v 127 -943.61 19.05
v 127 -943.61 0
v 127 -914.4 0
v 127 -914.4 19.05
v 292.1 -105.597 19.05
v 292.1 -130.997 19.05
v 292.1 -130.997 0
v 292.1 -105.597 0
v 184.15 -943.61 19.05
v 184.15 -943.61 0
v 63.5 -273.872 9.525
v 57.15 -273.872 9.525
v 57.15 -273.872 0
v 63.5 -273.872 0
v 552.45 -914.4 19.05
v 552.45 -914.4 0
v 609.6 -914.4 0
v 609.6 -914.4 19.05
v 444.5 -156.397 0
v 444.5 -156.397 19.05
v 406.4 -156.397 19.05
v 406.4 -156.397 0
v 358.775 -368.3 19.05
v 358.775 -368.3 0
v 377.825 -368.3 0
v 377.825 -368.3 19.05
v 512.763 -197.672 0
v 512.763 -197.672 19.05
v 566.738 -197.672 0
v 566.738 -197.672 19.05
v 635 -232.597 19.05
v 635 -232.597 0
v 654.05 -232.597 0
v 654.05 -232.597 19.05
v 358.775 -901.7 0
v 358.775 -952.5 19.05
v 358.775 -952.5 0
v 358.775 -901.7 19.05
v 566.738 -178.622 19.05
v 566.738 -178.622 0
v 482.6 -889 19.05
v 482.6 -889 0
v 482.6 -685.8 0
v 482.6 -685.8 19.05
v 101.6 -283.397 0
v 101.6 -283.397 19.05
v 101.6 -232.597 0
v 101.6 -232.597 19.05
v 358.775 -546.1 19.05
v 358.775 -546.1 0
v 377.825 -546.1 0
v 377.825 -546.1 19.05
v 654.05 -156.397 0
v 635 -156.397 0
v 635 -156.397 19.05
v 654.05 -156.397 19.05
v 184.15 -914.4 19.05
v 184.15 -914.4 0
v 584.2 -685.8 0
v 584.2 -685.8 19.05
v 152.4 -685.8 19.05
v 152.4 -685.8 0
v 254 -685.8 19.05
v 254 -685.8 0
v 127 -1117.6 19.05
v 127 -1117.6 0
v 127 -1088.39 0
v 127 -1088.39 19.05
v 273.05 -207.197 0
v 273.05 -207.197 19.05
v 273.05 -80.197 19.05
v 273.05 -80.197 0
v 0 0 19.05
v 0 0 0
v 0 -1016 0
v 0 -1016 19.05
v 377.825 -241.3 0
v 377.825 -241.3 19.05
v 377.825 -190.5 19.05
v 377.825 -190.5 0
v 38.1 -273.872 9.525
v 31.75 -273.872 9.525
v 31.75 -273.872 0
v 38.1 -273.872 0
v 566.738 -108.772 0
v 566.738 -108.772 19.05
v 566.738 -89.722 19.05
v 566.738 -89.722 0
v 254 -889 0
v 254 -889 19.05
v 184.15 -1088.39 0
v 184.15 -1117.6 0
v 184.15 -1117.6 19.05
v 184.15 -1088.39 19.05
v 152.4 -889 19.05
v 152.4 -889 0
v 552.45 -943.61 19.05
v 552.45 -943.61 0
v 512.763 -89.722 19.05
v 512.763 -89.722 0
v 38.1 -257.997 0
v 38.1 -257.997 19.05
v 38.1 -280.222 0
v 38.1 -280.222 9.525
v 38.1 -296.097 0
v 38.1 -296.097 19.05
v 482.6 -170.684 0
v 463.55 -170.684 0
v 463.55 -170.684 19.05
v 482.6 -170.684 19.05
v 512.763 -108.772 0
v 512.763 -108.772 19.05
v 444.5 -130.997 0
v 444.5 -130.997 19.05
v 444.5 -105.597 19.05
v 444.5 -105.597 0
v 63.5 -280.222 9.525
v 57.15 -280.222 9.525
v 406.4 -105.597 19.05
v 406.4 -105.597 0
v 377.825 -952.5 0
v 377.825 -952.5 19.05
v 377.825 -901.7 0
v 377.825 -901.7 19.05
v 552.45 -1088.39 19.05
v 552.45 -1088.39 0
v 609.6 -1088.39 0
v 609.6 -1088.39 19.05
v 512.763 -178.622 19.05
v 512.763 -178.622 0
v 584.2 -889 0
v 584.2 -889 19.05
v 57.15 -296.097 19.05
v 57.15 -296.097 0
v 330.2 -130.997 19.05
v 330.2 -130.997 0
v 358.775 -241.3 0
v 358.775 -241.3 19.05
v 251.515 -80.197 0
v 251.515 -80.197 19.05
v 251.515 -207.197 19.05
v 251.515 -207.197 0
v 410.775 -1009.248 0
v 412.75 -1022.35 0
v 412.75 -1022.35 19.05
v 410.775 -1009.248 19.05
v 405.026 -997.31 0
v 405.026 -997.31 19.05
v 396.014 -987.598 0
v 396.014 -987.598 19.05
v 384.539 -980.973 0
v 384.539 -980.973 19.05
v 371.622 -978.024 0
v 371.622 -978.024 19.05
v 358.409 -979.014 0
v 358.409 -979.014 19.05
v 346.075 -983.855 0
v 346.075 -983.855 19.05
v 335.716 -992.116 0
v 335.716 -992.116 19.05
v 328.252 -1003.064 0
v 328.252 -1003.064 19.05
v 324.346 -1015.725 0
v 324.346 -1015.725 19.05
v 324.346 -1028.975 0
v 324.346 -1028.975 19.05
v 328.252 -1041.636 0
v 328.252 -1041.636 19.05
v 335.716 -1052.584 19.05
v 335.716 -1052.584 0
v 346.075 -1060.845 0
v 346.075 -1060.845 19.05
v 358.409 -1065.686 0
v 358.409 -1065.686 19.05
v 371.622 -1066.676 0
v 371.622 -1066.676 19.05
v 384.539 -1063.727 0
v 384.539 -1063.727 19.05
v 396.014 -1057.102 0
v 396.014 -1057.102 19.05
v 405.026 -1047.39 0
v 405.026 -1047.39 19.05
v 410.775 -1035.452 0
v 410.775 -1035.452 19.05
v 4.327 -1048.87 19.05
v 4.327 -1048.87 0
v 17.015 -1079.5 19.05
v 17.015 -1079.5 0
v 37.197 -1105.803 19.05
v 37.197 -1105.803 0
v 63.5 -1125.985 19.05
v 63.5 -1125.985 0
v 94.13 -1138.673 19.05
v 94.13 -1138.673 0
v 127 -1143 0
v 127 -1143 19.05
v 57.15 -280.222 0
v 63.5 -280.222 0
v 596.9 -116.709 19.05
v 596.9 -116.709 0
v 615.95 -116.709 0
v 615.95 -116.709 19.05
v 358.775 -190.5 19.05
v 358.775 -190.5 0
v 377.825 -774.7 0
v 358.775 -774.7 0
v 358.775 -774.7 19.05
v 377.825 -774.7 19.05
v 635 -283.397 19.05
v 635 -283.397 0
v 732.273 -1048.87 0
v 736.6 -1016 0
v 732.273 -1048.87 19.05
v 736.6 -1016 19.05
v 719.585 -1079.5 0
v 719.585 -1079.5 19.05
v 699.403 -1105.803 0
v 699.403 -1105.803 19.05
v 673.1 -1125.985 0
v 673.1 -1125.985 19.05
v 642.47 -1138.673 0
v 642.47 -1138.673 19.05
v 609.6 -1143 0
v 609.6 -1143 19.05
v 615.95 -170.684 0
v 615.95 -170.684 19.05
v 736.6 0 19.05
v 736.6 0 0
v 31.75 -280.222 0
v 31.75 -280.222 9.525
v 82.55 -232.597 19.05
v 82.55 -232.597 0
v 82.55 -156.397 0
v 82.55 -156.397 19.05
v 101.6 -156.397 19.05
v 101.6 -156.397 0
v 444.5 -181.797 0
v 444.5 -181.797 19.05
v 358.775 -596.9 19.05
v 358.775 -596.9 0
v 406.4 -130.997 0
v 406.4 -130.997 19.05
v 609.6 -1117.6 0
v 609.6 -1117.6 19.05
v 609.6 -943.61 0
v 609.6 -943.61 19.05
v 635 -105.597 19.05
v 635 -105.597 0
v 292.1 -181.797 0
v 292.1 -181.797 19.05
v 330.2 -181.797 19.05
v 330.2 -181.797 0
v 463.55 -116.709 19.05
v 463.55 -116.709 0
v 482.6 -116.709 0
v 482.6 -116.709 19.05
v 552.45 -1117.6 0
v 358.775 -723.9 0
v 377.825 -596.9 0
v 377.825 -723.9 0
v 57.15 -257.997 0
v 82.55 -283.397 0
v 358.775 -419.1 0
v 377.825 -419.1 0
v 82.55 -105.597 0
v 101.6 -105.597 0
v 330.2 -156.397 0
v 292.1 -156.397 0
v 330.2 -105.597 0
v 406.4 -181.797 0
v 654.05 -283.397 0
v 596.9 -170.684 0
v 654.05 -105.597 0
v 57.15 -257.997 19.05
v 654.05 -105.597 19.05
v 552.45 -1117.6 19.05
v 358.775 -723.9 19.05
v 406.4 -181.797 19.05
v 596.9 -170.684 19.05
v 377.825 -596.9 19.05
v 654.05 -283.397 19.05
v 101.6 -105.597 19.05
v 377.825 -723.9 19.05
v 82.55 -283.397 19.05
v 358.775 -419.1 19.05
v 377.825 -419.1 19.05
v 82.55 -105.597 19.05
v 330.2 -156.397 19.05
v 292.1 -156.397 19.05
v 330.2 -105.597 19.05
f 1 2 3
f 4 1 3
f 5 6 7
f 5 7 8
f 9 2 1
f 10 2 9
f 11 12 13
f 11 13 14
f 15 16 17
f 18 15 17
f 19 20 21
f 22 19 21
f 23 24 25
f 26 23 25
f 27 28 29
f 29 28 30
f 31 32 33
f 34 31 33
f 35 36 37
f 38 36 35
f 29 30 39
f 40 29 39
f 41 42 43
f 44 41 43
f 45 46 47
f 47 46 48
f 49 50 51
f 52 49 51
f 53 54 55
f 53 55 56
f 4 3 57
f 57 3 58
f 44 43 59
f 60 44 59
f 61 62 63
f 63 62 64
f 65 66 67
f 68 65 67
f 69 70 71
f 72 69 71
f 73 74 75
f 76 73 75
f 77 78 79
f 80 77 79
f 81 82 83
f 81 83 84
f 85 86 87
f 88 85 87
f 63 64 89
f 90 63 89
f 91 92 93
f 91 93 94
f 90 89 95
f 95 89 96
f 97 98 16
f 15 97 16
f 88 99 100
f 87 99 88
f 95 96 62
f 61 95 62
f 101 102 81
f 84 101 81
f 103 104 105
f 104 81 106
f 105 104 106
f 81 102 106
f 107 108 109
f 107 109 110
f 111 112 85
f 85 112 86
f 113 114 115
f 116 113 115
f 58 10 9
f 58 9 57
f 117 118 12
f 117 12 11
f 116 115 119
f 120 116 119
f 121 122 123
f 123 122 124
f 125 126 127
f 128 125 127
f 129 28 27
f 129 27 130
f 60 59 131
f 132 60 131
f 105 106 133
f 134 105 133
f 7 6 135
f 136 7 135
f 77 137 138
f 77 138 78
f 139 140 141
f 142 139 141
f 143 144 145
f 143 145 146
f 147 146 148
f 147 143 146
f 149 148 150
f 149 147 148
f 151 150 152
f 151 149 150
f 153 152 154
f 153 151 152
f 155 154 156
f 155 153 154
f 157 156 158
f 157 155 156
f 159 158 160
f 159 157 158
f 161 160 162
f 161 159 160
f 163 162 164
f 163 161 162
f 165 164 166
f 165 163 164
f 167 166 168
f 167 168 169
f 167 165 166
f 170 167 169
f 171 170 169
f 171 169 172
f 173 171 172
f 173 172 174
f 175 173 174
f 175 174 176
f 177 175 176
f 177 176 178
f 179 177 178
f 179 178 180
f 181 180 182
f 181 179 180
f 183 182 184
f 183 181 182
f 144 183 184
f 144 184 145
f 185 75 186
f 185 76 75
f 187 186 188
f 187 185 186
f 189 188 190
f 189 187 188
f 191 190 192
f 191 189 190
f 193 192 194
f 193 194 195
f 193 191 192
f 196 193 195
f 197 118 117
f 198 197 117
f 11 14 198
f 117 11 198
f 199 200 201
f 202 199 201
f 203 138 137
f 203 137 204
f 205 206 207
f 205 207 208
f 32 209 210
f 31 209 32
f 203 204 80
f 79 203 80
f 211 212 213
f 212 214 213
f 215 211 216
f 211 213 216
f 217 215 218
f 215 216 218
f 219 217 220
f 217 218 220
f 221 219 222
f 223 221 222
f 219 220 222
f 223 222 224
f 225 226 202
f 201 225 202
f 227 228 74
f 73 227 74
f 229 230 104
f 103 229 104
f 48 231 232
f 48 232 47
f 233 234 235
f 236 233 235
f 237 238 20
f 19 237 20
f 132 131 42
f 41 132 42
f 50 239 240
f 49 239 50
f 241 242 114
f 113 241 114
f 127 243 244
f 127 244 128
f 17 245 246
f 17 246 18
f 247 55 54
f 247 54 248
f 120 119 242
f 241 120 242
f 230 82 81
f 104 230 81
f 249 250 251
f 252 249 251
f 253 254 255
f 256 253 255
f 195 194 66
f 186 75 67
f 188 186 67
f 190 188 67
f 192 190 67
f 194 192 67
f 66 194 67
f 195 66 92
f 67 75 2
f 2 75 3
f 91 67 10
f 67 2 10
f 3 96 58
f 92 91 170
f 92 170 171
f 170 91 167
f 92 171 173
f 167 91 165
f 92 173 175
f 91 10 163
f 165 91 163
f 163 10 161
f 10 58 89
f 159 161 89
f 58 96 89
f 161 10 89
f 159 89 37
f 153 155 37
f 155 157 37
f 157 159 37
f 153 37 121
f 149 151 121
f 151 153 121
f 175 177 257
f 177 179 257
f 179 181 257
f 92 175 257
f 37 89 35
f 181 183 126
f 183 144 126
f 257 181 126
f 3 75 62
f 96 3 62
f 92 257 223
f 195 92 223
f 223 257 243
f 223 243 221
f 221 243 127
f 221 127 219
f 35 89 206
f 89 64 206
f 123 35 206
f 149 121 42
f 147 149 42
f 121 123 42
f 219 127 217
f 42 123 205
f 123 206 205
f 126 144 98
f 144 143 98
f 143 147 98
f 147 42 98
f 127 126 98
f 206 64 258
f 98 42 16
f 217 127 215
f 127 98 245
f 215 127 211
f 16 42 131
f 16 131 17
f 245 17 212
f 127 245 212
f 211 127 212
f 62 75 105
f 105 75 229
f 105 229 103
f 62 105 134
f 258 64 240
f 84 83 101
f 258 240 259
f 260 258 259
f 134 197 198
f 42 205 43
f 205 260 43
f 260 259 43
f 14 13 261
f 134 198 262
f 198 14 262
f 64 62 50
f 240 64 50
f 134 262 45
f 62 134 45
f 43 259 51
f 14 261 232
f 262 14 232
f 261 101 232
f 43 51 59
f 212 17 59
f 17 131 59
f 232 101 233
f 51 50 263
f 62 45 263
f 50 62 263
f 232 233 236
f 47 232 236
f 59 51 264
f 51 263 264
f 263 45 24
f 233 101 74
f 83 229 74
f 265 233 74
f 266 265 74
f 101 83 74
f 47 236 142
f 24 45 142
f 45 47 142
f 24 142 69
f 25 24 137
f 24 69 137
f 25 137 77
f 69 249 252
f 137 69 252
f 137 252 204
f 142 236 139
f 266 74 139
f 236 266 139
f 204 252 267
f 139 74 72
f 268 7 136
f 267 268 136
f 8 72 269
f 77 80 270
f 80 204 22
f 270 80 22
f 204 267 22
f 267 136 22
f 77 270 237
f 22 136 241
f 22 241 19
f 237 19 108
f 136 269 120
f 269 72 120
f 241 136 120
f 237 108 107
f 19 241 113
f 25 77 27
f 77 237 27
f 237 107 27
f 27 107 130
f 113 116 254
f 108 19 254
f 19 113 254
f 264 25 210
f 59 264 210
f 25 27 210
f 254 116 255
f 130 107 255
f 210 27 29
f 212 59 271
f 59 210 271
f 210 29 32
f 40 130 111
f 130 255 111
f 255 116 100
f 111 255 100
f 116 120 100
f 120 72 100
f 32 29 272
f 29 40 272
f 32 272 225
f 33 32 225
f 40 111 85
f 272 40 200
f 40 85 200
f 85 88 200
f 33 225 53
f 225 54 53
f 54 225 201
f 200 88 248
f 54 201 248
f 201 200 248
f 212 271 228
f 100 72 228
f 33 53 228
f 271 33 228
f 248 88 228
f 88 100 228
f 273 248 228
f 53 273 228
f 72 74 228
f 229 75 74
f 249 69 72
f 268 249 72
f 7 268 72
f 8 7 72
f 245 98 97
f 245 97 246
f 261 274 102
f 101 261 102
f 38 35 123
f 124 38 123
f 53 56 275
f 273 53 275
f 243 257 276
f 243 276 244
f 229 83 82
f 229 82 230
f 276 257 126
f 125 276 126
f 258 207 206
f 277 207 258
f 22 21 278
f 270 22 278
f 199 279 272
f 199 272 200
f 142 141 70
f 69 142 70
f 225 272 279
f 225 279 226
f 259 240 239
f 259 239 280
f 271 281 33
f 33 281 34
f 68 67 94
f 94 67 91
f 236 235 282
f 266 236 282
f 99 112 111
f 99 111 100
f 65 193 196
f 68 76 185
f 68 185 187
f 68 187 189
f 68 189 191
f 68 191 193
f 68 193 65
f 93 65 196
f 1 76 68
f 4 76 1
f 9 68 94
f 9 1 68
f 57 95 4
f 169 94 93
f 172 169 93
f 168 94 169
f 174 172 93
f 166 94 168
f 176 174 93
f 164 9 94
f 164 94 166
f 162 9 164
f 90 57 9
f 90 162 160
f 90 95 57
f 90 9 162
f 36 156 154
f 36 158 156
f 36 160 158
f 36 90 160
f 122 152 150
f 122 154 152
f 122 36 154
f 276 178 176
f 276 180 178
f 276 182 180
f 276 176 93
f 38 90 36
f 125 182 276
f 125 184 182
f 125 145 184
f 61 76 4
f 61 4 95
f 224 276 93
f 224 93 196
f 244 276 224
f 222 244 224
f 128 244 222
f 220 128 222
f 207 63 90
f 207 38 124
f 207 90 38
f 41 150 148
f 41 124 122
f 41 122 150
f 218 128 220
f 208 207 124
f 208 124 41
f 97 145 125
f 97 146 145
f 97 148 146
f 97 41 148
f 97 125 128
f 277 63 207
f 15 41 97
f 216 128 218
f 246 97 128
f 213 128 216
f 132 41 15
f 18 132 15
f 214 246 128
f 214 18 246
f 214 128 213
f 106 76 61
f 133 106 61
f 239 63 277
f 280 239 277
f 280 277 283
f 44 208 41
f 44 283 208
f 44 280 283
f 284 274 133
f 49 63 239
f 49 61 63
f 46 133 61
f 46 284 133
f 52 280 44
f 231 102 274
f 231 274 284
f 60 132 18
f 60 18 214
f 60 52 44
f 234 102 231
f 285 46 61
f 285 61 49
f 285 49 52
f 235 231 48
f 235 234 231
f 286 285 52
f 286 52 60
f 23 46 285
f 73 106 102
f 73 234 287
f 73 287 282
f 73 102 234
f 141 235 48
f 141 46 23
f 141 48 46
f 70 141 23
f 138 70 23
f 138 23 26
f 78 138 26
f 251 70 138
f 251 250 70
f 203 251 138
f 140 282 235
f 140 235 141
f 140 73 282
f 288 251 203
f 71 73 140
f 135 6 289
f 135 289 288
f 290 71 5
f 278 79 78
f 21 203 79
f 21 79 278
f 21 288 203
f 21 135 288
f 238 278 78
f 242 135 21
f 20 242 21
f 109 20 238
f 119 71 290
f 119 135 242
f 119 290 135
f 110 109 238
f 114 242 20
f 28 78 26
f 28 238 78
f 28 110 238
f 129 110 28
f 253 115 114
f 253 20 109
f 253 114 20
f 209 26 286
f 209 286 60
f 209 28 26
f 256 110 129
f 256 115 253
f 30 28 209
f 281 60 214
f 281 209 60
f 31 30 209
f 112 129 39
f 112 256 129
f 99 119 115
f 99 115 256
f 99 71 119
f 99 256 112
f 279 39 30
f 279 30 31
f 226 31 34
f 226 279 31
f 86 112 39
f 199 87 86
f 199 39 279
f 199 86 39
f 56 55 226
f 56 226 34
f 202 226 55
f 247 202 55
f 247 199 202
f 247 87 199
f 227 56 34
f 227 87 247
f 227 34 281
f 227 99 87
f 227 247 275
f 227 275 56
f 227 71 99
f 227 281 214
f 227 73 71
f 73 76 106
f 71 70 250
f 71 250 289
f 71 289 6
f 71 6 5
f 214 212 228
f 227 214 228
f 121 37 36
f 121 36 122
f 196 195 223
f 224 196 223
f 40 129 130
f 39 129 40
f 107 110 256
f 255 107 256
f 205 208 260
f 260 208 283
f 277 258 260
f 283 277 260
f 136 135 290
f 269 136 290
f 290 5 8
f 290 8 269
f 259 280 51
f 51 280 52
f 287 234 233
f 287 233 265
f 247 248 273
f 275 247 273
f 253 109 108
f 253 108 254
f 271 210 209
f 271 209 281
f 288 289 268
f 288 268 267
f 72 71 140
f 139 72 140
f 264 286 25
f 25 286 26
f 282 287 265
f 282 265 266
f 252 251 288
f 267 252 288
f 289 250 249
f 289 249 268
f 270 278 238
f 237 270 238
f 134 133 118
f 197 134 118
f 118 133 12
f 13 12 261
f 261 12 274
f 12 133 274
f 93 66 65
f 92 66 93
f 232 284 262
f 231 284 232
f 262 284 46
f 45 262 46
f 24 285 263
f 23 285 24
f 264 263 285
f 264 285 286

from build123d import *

# Parameters (mm, degrees)
F0_W      = 57.15
F0_H      = 29.21
F0_R      = 44.45
F1_DEPTH  = 19.05
F2_W      = 19.05
F2_H      = 50.8
F3_DEPTH  = 25.4
F4_W      = 19.05
F4_H      = 50.8
F5_DEPTH  = 25.4
F6_W      = 38.1
F6_H      = 25.4
F6_W_2    = 53.975
F6_H_2    = 19.05
F6_W_3    = 19.05
F6_H_3    = 53.975
F7_DEPTH  = 25.4
F8_R      = 127
F10_DEPTH = 25.4
F11_W     = 6.35
F11_H     = 6.35
F12_DEPTH = 9.525


# Not quite as in the source:
# - a feature names something its author has since deleted; it is built from what else it names


with BuildPart() as f1:
    # F0 (on Top) → F1 (new body)
    with BuildSketch(Plane.XY):
        Polygon((358.775, 0), (0, 0), (0, -889), (152.4, -889), (152.4, -685.8), (254, -685.8), (254, -889), (482.6, -889), (482.6, -685.8), (584.2, -685.8), (584.2, -889), (736.6, -889), (736.6, 0), (377.825, 0), align=None)
        Polygon((152.4, -889), (0, -889), (0, -1143), (358.775, -1143), (377.825, -1143), (736.6, -1143), (736.6, -889), (584.2, -889), (482.6, -889), (254, -889), align=None)
        with Locations((155.575, -1102.995)):
            Rectangle(F0_W, F0_H, mode=Mode.SUBTRACT)
        with Locations((155.575, -929.005)):
            Rectangle(F0_W, F0_H, mode=Mode.SUBTRACT)
        with Locations((368.3, -1022.35)):
            Circle(F0_R, mode=Mode.SUBTRACT)
        with Locations((581.025, -1102.995)):
            Rectangle(F0_W, F0_H, mode=Mode.SUBTRACT)
        with Locations((581.025, -929.005)):
            Rectangle(F0_W, F0_H, mode=Mode.SUBTRACT)
    extrude(amount=F1_DEPTH)

    # F2 (on face) → F3 (cut)
    with BuildSketch(Plane.XY.offset(19.05)):
        with Locations((368.3, -215.9)):
            Rectangle(F2_W, F2_H)
        with Locations((368.3, -393.7)):
            Rectangle(F2_W, F2_H)
        with Locations((368.3, -571.5)):
            Rectangle(F2_W, F2_H)
        with Locations((368.3, -749.3)):
            Rectangle(F2_W, F2_H)
        with Locations((368.3, -927.1)):
            Rectangle(F2_W, F2_H)
    extrude(amount=-F3_DEPTH, mode=Mode.SUBTRACT)

    # F4 (on face) → F5 (cut)
    with BuildSketch(Plane.XY.offset(19.05)):
        with Locations((92.075, -130.9968532642)):
            Rectangle(F4_W, F4_H)
        with Locations((92.075, -257.9968532642)):
            Rectangle(F4_W, F4_H)
        with Locations((644.525, -130.9968532642)):
            Rectangle(F4_W, F4_H)
        with Locations((644.525, -257.9968532642)):
            Rectangle(F4_W, F4_H)
    extrude(amount=-F5_DEPTH, mode=Mode.SUBTRACT)

    # F6 (on face) → F7 (cut)
    with BuildSketch(Plane.XY.offset(19.05)):
        with Locations((311.15, -118.2968532642)):
            Rectangle(F6_W, F6_H)
        with Locations((311.15, -169.0968532642)):
            Rectangle(F6_W, F6_H)
        Polygon((444.5, -170.6843532642), (444.5, -156.3968532642), (406.4, -156.3968532642), (406.4, -181.7968532642), (444.5, -181.7968532642), align=None)
        Polygon((444.5, -116.7093532642), (444.5, -105.5968532642), (406.4, -105.5968532642), (406.4, -130.9968532642), (444.5, -130.9968532642), align=None)
        with Locations((539.75, -99.2468532642)):
            Rectangle(F6_W_2, F6_H_2)
        with Locations((473.075, -143.6968532642)):
            Rectangle(F6_W_3, F6_H_3)
        with Locations((539.75, -188.1468532642)):
            Rectangle(F6_W_2, F6_H_2)
        with Locations((606.425, -143.6968532642)):
            Rectangle(F6_W_3, F6_H_3)
        Polygon((273.05, -207.1968532642), (273.05, -143.6968532642), (273.05, -80.1968532642), (251.5147030354, -80.1968532642), (251.5147030354, -207.1968532642), align=None)
    extrude(amount=-F7_DEPTH, mode=Mode.SUBTRACT)

    # F8
    f8_edges = [f1.edges().sort_by_distance(p)[0] for p in [
        (0, -1143, 9.525),
        (736.6, -1143, 9.525),
    ]]
    fillet(f8_edges, radius=F8_R)

    # F9 (on face) → F10 (cut)
    with BuildSketch(Plane.XY.offset(19.05)):
        Polygon((57.15, -257.9968532642), (38.1, -257.9968532642), (38.1, -273.8015651703), (38.1, -280.3961336613), (38.1, -296.0968532642), (57.15, -296.0968532642), (57.15, -280.3961336613), (57.15, -273.8015651703), align=None)
    extrude(amount=-F10_DEPTH, mode=Mode.SUBTRACT)

    # F11 (on face) → F12 (cut)
    with BuildSketch(Plane(origin=(0, 0, 0), x_dir=(1, 0, 0), z_dir=(0, 0, -1))):
        with Locations((34.925, 277.0468532642)):
            Rectangle(F11_W, F11_H)
        with Locations((60.325, 277.0468532642)):
            Rectangle(F11_W, F11_H)
    extrude(amount=-F12_DEPTH, mode=Mode.SUBTRACT)


solid = f1.part
